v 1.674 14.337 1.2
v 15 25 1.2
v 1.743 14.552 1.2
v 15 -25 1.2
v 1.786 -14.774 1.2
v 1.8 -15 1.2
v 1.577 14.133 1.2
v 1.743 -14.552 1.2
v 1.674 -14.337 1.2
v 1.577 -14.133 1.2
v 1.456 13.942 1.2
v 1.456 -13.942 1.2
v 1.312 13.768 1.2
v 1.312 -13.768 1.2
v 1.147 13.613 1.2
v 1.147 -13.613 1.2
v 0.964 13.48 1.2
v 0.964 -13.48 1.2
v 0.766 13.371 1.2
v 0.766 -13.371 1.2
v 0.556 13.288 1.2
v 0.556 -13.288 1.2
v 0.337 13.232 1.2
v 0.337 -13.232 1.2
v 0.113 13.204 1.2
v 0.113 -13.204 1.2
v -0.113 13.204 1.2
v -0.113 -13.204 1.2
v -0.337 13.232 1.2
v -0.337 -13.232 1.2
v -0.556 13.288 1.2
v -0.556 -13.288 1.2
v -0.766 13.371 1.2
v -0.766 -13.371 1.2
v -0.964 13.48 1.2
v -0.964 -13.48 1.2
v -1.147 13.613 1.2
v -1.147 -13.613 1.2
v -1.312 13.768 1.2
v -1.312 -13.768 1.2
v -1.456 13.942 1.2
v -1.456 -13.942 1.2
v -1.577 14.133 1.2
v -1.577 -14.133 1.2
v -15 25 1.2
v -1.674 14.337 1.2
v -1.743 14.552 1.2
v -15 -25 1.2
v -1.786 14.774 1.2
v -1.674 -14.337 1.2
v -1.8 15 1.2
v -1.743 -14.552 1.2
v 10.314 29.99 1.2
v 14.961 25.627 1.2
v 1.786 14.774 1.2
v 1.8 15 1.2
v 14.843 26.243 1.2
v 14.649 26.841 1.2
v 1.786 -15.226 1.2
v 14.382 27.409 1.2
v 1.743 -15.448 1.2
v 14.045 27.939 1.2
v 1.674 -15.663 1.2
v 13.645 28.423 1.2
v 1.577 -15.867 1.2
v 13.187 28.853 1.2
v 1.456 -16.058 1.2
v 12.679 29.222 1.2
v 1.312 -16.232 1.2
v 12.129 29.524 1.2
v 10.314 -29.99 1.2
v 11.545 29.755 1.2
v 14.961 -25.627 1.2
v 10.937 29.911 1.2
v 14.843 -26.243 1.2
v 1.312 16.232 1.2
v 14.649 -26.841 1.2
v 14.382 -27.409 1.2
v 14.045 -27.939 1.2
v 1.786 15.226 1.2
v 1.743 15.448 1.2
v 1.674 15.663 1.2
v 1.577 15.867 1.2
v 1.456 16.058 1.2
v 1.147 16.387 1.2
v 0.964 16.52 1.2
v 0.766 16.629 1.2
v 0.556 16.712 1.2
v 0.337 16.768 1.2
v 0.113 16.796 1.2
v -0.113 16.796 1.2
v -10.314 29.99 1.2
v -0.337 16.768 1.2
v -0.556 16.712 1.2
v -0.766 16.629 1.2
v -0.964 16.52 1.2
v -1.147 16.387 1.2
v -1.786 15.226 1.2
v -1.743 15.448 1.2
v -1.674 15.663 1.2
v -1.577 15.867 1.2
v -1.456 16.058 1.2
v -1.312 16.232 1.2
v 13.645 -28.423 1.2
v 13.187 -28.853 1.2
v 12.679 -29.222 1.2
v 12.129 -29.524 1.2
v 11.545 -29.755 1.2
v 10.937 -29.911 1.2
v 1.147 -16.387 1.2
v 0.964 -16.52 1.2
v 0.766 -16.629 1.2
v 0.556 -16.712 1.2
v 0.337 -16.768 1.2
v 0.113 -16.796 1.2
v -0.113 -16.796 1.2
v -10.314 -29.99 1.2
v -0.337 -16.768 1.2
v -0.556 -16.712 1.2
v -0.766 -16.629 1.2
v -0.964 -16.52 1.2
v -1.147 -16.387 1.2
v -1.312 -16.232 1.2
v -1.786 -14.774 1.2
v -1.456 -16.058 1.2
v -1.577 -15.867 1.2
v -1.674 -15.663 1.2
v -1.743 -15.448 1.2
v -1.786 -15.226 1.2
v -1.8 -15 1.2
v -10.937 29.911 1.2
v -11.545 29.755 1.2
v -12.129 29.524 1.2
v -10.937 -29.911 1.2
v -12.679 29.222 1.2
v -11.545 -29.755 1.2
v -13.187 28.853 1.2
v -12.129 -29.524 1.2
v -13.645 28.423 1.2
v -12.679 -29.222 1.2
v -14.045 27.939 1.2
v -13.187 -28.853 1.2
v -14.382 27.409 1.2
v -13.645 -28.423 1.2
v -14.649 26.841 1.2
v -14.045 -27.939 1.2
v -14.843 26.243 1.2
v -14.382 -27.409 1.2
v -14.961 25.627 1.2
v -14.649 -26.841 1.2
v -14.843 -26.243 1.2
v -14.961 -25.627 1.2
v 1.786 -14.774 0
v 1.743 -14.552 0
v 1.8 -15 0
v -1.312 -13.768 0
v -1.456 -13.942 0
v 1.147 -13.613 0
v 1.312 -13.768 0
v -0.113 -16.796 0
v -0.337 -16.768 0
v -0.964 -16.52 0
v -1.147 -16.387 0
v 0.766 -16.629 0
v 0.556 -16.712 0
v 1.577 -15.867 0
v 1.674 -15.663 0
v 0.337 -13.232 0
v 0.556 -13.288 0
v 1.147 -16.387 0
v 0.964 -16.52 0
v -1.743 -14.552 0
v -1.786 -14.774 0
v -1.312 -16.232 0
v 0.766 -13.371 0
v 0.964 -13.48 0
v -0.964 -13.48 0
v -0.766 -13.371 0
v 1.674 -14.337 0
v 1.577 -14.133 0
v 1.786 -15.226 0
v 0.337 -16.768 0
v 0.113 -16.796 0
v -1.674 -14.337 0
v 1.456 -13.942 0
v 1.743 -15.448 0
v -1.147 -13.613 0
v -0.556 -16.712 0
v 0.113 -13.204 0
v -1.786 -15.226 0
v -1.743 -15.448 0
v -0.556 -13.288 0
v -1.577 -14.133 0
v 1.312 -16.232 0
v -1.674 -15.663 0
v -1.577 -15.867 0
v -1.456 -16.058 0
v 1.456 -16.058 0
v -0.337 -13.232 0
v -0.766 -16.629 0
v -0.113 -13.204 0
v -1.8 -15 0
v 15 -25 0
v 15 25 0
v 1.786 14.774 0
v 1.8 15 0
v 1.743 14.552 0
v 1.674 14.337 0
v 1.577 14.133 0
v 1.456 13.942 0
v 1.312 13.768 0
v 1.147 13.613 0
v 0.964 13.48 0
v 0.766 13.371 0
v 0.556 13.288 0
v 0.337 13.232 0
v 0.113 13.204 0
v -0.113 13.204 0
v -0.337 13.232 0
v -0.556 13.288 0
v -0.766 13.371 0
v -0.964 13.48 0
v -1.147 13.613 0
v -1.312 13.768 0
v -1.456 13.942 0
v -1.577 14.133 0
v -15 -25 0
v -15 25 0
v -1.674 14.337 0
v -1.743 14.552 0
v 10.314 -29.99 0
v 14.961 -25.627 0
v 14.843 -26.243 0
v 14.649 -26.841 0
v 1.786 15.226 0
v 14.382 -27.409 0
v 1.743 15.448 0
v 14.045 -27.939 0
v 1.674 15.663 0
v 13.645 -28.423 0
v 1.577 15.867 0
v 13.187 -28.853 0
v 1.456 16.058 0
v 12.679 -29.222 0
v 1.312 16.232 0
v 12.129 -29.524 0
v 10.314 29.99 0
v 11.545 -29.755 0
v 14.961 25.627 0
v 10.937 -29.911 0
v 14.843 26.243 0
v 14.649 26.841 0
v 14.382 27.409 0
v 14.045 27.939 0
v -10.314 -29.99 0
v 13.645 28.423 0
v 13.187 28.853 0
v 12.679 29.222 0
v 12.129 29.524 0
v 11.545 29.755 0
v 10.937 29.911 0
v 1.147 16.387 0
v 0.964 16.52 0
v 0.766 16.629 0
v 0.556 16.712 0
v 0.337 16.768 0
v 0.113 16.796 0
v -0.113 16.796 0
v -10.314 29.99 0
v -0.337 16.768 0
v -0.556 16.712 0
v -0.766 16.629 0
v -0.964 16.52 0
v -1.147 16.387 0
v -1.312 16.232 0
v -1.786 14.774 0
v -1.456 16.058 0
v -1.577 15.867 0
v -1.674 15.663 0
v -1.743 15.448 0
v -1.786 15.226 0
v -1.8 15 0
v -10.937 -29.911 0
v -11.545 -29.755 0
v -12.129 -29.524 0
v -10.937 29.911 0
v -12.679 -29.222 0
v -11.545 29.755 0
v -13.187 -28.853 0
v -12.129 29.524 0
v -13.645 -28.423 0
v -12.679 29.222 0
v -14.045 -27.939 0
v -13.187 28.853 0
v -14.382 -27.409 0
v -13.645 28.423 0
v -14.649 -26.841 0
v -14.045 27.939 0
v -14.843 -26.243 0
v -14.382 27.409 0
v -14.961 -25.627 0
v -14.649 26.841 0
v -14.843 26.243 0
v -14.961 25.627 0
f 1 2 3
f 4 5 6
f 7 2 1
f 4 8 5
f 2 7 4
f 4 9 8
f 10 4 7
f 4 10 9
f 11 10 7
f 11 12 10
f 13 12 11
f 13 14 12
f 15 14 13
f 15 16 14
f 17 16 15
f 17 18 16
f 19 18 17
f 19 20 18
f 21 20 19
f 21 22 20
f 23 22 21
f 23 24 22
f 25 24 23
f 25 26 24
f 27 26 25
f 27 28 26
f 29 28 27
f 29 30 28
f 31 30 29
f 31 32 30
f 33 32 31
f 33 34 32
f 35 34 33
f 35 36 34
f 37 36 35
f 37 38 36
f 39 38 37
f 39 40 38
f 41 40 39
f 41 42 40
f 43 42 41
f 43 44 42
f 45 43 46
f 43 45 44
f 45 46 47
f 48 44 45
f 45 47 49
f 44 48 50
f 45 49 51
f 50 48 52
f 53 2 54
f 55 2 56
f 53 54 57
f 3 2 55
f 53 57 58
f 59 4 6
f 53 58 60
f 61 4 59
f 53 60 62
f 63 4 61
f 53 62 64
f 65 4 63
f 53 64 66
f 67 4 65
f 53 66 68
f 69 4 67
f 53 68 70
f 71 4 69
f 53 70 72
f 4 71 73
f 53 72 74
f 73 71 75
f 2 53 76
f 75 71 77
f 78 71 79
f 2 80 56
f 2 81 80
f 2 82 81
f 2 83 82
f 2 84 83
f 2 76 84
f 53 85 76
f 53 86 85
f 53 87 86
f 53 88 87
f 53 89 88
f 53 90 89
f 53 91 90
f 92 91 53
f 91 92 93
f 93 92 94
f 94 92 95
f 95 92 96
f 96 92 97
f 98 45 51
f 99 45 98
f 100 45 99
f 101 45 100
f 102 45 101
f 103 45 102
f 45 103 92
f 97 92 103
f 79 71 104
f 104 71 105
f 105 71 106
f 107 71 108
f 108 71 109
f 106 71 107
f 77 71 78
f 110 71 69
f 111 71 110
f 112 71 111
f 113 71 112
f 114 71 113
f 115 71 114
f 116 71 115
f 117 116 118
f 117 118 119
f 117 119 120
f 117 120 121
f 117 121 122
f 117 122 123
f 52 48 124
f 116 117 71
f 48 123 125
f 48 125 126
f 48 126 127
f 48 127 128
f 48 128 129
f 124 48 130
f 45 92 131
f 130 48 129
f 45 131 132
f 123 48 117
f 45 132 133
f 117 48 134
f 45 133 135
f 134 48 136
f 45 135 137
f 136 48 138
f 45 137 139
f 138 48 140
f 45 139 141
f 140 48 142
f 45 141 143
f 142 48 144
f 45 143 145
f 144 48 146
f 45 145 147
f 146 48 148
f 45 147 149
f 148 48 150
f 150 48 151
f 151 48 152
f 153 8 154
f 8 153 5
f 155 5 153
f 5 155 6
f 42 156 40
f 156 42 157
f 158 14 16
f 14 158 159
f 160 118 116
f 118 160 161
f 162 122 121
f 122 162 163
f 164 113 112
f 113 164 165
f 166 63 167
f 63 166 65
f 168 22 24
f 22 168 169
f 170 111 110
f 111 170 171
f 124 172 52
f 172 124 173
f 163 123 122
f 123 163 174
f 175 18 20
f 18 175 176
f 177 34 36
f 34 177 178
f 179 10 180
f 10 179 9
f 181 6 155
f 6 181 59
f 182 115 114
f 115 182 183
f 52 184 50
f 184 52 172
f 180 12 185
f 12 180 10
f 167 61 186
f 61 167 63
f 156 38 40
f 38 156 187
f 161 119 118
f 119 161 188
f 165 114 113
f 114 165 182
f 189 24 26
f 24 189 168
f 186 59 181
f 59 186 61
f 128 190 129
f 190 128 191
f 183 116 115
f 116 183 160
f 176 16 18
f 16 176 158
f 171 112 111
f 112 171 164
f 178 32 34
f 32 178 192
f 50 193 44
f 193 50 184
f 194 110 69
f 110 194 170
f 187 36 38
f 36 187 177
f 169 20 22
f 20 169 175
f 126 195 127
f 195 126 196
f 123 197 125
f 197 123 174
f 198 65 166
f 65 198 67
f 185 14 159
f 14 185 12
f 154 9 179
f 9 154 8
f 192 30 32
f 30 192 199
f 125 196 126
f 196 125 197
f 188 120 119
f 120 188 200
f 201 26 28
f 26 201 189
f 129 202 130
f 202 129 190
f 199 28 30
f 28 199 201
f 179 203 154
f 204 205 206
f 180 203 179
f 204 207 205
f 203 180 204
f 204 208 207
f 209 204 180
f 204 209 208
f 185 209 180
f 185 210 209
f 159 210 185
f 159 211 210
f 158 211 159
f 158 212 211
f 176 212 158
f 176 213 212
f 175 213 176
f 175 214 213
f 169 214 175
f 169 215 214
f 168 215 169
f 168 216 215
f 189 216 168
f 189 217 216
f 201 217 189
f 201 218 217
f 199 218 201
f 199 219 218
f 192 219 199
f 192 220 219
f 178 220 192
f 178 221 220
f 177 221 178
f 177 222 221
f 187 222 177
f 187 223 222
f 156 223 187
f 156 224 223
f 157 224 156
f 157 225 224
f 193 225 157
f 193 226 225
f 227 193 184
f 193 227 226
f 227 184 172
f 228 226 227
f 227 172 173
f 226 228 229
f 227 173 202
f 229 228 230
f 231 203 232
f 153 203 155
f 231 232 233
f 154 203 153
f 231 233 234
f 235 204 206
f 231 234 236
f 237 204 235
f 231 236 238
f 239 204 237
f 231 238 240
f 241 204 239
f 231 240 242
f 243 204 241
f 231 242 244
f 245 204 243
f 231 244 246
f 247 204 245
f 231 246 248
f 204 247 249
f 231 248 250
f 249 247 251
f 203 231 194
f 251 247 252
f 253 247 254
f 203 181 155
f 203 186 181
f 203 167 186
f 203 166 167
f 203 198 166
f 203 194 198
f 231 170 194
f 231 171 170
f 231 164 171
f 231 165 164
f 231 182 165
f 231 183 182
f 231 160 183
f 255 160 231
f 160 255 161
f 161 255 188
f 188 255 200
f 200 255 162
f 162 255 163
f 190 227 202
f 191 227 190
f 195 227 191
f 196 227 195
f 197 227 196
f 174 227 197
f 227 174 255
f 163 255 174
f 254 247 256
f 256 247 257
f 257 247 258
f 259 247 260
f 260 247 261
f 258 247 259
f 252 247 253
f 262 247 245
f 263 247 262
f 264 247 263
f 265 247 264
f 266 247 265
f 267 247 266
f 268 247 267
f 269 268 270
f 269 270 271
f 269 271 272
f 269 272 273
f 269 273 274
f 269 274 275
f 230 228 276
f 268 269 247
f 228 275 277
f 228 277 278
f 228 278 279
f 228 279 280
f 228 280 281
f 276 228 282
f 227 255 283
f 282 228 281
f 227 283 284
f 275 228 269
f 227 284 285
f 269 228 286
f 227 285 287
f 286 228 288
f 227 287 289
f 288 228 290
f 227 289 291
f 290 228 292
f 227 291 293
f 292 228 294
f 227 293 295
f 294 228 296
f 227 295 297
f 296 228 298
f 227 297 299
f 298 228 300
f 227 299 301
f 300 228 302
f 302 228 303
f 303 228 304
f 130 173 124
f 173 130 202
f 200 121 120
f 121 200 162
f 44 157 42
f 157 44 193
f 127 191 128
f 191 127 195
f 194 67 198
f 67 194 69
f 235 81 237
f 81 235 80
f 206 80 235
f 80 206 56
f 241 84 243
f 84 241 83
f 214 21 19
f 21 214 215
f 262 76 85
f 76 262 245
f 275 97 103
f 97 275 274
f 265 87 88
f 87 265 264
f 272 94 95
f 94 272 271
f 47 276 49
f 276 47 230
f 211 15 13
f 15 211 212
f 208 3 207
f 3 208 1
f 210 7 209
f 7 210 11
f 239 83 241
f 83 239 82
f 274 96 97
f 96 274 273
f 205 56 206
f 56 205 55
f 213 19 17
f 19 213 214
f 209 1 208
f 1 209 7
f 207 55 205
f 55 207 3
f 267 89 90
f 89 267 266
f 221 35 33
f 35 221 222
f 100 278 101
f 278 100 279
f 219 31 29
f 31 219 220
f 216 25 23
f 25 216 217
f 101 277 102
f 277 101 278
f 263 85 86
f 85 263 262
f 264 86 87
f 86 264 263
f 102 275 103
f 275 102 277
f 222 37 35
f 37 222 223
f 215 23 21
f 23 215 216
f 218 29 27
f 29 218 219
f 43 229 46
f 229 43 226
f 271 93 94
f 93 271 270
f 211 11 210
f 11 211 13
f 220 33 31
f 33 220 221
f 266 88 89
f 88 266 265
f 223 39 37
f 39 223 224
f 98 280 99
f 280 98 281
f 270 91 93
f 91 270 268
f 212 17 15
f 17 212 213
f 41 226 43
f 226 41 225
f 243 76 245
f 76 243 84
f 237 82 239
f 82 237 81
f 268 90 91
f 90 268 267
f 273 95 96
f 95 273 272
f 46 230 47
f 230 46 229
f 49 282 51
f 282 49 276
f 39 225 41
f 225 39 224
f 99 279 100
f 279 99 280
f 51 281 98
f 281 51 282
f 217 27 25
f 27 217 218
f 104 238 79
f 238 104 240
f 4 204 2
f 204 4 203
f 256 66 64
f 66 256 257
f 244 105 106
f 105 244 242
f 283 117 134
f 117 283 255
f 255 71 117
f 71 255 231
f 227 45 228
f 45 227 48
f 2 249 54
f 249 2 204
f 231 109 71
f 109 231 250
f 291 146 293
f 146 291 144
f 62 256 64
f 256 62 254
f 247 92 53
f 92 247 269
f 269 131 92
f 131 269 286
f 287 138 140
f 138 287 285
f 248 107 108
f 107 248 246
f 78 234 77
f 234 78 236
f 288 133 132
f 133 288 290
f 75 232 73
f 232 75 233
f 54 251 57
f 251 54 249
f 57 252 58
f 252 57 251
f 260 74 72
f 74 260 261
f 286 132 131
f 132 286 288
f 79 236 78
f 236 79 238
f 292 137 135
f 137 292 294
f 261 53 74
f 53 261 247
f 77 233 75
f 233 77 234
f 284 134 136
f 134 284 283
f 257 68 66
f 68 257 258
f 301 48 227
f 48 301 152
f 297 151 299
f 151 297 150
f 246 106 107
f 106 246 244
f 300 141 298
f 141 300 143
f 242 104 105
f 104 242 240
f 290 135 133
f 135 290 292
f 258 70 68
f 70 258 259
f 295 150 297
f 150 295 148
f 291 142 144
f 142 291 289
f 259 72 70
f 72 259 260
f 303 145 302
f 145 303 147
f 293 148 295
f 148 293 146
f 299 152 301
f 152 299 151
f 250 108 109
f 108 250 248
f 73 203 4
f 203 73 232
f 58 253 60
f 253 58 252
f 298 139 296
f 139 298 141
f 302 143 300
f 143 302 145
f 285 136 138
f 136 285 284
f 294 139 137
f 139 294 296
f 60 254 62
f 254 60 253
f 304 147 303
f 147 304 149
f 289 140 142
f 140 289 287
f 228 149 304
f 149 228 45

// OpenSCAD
$fn = 50;


difference() {
	union() {
		hull() {
			translate(v = [-10.0000000000, 25.0000000000, 0]) {
				cylinder(h = 27, r = 5);
			}
			translate(v = [10.0000000000, 25.0000000000, 0]) {
				cylinder(h = 27, r = 5);
			}
			translate(v = [-10.0000000000, -25.0000000000, 0]) {
				cylinder(h = 27, r = 5);
			}
			translate(v = [10.0000000000, -25.0000000000, 0]) {
				cylinder(h = 27, r = 5);
			}
		}
	}
	union() {
		translate(v = [0, 0, 1.2000000000]) {
			hull() {
				translate(v = [-10.0000000000, 25.0000000000, 0]) {
					cylinder(h = 25.8000000000, r = 3.8000000000);
				}
				translate(v = [10.0000000000, 25.0000000000, 0]) {
					cylinder(h = 25.8000000000, r = 3.8000000000);
				}
				translate(v = [-10.0000000000, -25.0000000000, 0]) {
					cylinder(h = 25.8000000000, r = 3.8000000000);
				}
				translate(v = [10.0000000000, -25.0000000000, 0]) {
					cylinder(h = 25.8000000000, r = 3.8000000000);
				}
			}
		}
		#translate(v = [0.0000000000, -15.0000000000, 0]) {
			cylinder(h = 1.2000000000, r = 1.8000000000);
		}
		#translate(v = [0.0000000000, 15.0000000000, 0]) {
			cylinder(h = 1.2000000000, r = 1.8000000000);
		}
		translate(v = [-250.0000000000, -250.0000000000, 1.2000000000]) {
			cube(size = [500, 500, 500]);
		}
		translate(v = [-250.0000000000, -250.0000000000, 1.2000000000]) {
			cube(size = [500, 500, 500]);
		}
		translate(v = [-250.0000000000, -250.0000000000, 1.2000000000]) {
			cube(size = [500, 500, 500]);
		}
	}
}
